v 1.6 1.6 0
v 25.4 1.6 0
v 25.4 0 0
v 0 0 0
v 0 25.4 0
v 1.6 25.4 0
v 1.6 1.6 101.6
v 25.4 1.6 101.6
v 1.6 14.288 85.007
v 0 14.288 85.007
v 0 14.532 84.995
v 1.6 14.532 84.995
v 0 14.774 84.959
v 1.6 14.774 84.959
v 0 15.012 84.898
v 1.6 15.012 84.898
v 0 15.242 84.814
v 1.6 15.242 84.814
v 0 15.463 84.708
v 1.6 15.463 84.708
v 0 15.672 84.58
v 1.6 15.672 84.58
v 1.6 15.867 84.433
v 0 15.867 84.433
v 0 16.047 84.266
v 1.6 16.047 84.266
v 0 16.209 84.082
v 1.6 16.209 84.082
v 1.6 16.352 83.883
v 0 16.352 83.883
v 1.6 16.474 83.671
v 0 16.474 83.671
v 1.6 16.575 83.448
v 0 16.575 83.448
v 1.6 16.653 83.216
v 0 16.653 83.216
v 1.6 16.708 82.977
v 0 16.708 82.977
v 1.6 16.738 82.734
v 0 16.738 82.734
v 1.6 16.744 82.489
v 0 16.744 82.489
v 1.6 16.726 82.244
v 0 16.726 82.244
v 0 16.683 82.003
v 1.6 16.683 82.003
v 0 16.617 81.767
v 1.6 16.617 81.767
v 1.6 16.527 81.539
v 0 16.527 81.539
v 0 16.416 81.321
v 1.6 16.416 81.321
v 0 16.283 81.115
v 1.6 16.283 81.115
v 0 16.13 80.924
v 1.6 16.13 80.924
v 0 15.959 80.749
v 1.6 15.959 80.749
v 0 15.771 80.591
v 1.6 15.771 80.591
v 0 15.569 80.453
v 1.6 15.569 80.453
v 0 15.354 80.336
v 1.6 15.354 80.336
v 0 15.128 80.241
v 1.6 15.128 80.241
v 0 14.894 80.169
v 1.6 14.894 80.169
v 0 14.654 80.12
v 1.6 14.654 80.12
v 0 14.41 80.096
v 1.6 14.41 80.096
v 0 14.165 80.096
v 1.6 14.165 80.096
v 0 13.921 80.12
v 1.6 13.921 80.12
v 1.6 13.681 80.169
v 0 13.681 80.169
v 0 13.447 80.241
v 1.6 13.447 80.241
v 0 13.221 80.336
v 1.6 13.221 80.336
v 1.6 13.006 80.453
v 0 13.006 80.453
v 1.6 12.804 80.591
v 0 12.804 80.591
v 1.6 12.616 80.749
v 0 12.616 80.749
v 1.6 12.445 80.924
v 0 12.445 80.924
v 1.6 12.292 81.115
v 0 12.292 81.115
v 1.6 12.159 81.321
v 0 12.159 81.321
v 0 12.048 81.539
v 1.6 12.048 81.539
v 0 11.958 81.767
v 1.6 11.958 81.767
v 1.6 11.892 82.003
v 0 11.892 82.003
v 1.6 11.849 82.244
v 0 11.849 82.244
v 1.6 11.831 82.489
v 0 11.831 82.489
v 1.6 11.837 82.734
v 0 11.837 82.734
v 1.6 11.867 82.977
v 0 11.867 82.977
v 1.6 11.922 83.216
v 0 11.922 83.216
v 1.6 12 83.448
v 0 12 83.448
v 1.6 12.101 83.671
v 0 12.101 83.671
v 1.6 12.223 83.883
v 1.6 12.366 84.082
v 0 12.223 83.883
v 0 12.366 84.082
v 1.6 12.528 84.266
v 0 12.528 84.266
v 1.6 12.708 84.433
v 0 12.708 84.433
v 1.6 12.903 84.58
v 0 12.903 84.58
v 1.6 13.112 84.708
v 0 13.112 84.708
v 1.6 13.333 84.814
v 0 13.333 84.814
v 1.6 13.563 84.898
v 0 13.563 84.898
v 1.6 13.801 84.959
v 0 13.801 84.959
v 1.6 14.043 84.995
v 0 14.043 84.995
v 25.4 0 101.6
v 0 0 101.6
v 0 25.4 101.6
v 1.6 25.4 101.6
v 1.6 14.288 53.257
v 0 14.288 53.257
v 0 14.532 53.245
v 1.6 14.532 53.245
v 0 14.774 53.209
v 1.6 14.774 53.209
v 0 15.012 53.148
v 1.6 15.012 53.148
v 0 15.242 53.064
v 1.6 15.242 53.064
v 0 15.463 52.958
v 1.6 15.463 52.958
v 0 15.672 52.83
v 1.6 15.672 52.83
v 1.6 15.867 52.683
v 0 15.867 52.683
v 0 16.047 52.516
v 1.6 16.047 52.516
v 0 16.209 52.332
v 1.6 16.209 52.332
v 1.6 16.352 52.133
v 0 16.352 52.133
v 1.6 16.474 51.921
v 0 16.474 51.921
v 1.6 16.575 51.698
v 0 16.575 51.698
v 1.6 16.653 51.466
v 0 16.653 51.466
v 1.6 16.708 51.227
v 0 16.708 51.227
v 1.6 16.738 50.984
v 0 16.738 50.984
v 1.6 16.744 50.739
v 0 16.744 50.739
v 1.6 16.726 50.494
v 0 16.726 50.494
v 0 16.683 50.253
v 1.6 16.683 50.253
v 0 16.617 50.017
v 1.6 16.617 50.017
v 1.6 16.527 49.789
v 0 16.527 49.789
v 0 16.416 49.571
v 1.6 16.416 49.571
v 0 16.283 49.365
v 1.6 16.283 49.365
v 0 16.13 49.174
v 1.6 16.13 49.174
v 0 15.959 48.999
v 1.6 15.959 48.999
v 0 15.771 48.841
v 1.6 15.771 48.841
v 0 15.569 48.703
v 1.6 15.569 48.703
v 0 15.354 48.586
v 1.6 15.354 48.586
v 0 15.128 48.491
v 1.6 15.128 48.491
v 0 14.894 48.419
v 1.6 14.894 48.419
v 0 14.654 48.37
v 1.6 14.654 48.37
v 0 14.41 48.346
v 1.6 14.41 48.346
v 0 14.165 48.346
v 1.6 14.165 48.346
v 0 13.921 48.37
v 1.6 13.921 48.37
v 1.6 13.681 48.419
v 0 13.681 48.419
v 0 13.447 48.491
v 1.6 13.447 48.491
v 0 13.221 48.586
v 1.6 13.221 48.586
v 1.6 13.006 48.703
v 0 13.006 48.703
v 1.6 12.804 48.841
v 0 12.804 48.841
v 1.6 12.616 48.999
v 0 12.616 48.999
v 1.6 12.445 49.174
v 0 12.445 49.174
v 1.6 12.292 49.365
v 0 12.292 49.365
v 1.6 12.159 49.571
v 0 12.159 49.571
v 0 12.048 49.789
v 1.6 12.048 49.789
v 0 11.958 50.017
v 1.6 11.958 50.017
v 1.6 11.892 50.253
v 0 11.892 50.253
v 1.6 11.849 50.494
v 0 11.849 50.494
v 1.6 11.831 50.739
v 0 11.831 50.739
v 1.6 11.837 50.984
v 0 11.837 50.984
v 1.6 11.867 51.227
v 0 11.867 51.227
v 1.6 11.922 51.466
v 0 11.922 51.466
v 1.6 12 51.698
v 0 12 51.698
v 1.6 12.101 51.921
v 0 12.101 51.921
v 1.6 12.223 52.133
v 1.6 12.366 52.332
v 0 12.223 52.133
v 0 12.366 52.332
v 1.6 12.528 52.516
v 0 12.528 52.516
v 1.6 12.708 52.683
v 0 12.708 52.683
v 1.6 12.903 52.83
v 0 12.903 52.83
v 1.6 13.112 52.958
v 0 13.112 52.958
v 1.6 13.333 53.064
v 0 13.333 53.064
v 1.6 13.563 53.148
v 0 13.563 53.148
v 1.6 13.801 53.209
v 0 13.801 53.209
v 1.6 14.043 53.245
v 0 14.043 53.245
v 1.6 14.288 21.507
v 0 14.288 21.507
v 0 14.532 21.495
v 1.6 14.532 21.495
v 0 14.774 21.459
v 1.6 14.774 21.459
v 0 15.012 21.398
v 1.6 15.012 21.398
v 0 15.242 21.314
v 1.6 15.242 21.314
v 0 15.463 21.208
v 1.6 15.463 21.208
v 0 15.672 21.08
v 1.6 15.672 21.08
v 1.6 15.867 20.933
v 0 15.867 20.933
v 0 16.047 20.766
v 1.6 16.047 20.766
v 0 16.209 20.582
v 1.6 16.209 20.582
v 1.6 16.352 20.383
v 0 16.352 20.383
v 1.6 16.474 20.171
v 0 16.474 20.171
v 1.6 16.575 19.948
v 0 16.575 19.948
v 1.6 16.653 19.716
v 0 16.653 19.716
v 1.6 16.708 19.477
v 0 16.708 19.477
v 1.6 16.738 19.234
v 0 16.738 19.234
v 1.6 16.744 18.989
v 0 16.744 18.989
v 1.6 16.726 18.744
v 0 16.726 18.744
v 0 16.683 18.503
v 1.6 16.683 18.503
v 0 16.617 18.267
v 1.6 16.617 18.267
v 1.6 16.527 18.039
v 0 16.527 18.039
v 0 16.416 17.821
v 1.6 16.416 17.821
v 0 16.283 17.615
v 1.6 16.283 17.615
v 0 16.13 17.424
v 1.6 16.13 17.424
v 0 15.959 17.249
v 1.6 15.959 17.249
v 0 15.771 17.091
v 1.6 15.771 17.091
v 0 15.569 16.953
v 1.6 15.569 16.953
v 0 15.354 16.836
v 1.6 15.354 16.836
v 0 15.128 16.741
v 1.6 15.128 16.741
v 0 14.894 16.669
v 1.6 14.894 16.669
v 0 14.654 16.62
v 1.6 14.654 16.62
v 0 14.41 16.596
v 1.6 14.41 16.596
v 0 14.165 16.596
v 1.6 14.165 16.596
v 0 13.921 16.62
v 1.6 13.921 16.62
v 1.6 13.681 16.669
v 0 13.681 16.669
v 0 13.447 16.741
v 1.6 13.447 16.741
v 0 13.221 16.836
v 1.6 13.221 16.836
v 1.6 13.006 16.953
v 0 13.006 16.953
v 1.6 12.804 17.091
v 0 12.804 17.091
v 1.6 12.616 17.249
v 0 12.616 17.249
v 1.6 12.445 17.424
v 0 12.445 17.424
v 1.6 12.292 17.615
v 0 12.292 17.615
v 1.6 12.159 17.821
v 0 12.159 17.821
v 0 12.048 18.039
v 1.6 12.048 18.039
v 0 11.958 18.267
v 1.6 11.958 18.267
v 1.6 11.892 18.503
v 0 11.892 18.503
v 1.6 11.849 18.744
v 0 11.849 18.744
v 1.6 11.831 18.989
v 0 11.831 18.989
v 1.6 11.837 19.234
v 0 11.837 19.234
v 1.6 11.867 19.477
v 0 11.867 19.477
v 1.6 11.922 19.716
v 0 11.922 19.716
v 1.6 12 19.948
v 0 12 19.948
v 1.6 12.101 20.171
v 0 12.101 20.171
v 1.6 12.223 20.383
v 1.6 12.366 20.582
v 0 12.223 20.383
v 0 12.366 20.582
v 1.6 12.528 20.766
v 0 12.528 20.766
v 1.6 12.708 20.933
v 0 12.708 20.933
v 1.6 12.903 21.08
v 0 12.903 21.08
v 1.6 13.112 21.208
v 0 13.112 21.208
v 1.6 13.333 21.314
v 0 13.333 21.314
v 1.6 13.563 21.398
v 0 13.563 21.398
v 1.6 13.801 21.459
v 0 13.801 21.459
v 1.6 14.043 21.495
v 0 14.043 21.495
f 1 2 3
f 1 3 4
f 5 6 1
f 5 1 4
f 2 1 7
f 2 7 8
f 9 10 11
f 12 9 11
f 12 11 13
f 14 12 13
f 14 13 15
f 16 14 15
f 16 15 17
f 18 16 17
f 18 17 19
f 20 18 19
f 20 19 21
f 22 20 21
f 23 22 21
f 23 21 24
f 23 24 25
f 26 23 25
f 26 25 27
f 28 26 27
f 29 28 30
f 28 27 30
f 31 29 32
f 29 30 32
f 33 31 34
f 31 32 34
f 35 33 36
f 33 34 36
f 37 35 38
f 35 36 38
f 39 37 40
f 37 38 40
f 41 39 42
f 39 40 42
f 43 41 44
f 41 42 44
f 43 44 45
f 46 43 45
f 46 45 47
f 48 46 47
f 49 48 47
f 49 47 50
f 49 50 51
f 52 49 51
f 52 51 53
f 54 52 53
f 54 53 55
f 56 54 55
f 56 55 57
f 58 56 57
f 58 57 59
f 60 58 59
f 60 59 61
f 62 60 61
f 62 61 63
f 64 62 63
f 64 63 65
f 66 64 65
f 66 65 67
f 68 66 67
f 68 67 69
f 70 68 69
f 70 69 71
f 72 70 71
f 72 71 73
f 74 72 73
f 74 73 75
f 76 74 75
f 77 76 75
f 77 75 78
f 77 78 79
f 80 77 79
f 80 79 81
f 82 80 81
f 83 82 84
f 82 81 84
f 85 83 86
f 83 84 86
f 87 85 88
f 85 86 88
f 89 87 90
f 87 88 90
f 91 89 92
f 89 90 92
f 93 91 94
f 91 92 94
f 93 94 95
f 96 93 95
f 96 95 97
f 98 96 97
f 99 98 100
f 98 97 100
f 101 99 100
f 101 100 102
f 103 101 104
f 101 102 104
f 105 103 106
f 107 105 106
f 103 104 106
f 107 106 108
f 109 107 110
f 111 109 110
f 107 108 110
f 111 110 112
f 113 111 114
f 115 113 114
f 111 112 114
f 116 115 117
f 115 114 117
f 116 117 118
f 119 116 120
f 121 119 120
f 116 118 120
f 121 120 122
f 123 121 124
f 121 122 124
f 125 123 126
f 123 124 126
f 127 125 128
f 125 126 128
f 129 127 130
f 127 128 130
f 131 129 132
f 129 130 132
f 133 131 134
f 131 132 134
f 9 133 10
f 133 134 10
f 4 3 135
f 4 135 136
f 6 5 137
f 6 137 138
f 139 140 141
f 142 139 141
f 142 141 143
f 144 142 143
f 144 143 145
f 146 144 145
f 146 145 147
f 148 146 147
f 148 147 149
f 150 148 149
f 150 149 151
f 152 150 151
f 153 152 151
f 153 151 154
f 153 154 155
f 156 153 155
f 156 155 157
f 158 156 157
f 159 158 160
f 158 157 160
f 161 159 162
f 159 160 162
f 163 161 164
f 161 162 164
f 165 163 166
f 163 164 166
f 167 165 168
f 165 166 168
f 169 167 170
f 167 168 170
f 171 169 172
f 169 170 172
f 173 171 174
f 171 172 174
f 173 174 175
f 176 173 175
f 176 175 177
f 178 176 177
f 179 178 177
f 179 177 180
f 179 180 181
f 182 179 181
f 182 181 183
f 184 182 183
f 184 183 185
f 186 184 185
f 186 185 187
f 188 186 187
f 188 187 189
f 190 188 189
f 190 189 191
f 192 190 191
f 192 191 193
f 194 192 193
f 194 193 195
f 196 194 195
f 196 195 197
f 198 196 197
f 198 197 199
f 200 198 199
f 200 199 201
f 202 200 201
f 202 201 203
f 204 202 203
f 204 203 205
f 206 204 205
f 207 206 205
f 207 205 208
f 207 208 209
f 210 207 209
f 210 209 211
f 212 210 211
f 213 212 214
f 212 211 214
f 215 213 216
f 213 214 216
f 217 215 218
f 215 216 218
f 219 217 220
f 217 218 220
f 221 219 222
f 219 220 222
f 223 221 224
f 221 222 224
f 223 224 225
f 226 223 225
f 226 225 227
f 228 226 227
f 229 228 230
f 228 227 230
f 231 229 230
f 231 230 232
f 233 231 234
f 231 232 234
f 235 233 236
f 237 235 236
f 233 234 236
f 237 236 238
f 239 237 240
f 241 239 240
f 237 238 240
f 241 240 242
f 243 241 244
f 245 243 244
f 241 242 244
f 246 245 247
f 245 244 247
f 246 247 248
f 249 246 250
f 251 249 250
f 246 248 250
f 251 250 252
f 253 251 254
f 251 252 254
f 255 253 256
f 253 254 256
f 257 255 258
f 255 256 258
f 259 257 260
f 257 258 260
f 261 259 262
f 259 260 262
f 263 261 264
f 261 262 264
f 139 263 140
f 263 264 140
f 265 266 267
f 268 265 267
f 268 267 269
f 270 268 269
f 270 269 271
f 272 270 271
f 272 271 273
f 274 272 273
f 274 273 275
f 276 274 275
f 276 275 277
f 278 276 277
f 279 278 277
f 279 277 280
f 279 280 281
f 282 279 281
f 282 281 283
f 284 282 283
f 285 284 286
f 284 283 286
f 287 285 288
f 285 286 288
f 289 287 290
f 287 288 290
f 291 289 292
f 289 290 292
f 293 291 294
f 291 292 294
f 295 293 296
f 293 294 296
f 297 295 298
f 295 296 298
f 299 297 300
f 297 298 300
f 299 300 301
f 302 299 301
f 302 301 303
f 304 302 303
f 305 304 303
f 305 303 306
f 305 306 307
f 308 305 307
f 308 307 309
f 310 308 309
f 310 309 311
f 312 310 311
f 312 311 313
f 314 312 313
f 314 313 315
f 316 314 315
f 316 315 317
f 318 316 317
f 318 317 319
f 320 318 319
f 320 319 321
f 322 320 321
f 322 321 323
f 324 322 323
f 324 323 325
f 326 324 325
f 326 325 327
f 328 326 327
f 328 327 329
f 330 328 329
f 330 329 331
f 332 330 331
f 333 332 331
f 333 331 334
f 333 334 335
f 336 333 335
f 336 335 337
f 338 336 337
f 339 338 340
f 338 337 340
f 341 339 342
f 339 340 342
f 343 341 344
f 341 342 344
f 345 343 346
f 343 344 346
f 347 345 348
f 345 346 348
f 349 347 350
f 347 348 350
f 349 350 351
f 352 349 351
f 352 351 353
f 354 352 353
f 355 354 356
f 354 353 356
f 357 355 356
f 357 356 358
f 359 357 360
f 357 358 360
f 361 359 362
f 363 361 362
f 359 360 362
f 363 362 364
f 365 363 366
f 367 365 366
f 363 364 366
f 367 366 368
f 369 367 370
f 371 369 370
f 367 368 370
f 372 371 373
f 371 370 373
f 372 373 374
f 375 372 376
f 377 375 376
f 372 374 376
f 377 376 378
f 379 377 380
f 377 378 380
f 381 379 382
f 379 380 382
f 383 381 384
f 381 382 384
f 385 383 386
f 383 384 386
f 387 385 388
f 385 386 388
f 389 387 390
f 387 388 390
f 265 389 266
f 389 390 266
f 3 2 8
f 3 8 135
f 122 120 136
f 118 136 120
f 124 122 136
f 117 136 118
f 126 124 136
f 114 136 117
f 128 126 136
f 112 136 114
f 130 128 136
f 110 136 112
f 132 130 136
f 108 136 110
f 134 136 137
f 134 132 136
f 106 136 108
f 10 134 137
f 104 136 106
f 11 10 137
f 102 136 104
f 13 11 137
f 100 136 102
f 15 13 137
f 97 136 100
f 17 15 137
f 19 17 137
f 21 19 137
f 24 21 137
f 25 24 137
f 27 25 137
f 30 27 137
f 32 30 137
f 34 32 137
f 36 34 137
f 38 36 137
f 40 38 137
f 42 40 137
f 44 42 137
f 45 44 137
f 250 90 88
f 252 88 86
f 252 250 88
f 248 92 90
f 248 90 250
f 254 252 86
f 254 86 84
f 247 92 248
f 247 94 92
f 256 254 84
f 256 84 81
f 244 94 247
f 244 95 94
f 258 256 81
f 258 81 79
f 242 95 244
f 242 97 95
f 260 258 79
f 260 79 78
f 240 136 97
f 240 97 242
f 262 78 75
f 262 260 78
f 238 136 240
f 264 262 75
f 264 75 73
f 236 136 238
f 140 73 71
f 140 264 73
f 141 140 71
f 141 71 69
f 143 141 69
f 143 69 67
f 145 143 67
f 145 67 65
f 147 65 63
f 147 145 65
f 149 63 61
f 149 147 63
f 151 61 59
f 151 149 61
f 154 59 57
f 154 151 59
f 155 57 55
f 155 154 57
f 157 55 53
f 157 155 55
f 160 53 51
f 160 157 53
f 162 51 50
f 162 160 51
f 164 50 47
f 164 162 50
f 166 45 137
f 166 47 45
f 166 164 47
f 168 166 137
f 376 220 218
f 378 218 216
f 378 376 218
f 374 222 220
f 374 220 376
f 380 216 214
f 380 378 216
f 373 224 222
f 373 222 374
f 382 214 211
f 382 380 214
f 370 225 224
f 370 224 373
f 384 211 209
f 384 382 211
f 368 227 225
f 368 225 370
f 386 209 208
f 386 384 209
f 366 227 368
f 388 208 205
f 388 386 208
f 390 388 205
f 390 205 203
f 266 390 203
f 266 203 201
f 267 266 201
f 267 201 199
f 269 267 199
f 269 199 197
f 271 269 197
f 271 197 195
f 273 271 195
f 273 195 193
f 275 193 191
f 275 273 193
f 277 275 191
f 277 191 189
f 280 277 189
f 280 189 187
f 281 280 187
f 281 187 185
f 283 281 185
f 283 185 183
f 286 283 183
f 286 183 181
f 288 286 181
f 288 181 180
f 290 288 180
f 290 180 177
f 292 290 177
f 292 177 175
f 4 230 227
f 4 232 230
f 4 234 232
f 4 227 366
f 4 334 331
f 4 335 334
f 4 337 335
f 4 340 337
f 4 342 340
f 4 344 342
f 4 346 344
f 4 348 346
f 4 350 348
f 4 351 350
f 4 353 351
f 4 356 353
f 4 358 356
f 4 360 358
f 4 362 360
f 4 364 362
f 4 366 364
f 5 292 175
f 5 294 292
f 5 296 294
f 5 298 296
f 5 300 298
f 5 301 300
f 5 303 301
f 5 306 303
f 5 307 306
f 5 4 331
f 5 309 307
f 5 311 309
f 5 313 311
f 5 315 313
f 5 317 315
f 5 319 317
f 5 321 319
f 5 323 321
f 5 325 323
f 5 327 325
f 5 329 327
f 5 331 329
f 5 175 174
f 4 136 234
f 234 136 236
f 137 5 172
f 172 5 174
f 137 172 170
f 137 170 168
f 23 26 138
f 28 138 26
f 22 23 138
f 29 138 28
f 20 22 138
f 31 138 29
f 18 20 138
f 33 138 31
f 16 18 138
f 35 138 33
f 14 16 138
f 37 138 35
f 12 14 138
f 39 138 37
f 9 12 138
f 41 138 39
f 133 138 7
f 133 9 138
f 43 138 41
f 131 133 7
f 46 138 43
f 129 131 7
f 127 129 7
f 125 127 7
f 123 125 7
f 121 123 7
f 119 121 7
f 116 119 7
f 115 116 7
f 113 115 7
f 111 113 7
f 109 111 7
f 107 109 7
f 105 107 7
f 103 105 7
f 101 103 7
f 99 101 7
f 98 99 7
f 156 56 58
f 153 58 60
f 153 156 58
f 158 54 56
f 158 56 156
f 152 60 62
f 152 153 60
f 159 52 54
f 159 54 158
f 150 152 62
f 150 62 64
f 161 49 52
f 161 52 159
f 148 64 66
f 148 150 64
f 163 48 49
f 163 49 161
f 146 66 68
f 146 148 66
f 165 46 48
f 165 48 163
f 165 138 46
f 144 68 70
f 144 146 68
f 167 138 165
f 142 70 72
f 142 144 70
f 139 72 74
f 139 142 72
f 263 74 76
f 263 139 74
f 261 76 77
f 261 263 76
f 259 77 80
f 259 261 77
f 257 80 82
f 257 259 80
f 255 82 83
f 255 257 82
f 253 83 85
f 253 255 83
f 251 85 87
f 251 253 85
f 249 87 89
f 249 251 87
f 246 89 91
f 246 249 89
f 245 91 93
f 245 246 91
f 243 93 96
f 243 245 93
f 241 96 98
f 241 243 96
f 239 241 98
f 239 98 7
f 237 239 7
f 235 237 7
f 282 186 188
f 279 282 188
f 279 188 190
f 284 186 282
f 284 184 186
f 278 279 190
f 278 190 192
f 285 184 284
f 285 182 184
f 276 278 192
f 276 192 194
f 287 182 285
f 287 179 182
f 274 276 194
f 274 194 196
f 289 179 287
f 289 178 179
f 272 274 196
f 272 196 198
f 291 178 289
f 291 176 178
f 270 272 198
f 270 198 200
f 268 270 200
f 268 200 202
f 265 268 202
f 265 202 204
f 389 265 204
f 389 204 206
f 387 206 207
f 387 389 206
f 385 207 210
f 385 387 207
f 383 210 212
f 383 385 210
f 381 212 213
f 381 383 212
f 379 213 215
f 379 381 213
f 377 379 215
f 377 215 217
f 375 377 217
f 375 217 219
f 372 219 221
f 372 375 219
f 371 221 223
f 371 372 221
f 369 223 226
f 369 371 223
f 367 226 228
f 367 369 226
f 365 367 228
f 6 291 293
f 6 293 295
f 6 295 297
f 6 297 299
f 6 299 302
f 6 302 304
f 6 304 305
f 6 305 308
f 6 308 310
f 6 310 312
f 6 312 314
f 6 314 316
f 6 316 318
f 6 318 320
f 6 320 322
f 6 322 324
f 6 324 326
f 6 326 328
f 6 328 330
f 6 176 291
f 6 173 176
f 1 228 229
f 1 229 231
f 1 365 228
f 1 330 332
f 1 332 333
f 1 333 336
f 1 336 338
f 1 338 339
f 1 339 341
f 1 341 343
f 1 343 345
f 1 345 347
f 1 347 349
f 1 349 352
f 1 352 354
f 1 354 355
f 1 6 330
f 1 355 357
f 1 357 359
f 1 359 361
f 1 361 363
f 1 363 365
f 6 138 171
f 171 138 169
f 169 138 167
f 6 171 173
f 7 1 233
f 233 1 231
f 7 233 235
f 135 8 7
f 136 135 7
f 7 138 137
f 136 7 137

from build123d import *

# Parameters (mm, degrees)
BOSS_EXTRUDE1_DEPTH          = 101.6
F_10_0_1935_DIAMETER_HOLE1_D = 4.9149


with BuildPart() as part:
    # Sketch1 → Boss-Extrude1 (new body)
    with BuildSketch(Plane.XY):
        Polygon((0, 0), (0, 25.4), (1.6002, 25.4), (1.6002, 1.6002), (25.4, 1.6002), (25.4, 0), align=None)
    extrude(amount=BOSS_EXTRUDE1_DEPTH)

    # #10 (0.1935) Diameter Hole1 (through all)
    with Locations(Plane(origin=(1.6002, 0, 0), x_dir=(0, 0, -1), z_dir=(1, 0, 0))):
        with Locations((-82.55, 14.2875), (-50.8, 14.2875), (-19.05, 14.2875)):
            Hole(F_10_0_1935_DIAMETER_HOLE1_D / 2)


solid = part.part
